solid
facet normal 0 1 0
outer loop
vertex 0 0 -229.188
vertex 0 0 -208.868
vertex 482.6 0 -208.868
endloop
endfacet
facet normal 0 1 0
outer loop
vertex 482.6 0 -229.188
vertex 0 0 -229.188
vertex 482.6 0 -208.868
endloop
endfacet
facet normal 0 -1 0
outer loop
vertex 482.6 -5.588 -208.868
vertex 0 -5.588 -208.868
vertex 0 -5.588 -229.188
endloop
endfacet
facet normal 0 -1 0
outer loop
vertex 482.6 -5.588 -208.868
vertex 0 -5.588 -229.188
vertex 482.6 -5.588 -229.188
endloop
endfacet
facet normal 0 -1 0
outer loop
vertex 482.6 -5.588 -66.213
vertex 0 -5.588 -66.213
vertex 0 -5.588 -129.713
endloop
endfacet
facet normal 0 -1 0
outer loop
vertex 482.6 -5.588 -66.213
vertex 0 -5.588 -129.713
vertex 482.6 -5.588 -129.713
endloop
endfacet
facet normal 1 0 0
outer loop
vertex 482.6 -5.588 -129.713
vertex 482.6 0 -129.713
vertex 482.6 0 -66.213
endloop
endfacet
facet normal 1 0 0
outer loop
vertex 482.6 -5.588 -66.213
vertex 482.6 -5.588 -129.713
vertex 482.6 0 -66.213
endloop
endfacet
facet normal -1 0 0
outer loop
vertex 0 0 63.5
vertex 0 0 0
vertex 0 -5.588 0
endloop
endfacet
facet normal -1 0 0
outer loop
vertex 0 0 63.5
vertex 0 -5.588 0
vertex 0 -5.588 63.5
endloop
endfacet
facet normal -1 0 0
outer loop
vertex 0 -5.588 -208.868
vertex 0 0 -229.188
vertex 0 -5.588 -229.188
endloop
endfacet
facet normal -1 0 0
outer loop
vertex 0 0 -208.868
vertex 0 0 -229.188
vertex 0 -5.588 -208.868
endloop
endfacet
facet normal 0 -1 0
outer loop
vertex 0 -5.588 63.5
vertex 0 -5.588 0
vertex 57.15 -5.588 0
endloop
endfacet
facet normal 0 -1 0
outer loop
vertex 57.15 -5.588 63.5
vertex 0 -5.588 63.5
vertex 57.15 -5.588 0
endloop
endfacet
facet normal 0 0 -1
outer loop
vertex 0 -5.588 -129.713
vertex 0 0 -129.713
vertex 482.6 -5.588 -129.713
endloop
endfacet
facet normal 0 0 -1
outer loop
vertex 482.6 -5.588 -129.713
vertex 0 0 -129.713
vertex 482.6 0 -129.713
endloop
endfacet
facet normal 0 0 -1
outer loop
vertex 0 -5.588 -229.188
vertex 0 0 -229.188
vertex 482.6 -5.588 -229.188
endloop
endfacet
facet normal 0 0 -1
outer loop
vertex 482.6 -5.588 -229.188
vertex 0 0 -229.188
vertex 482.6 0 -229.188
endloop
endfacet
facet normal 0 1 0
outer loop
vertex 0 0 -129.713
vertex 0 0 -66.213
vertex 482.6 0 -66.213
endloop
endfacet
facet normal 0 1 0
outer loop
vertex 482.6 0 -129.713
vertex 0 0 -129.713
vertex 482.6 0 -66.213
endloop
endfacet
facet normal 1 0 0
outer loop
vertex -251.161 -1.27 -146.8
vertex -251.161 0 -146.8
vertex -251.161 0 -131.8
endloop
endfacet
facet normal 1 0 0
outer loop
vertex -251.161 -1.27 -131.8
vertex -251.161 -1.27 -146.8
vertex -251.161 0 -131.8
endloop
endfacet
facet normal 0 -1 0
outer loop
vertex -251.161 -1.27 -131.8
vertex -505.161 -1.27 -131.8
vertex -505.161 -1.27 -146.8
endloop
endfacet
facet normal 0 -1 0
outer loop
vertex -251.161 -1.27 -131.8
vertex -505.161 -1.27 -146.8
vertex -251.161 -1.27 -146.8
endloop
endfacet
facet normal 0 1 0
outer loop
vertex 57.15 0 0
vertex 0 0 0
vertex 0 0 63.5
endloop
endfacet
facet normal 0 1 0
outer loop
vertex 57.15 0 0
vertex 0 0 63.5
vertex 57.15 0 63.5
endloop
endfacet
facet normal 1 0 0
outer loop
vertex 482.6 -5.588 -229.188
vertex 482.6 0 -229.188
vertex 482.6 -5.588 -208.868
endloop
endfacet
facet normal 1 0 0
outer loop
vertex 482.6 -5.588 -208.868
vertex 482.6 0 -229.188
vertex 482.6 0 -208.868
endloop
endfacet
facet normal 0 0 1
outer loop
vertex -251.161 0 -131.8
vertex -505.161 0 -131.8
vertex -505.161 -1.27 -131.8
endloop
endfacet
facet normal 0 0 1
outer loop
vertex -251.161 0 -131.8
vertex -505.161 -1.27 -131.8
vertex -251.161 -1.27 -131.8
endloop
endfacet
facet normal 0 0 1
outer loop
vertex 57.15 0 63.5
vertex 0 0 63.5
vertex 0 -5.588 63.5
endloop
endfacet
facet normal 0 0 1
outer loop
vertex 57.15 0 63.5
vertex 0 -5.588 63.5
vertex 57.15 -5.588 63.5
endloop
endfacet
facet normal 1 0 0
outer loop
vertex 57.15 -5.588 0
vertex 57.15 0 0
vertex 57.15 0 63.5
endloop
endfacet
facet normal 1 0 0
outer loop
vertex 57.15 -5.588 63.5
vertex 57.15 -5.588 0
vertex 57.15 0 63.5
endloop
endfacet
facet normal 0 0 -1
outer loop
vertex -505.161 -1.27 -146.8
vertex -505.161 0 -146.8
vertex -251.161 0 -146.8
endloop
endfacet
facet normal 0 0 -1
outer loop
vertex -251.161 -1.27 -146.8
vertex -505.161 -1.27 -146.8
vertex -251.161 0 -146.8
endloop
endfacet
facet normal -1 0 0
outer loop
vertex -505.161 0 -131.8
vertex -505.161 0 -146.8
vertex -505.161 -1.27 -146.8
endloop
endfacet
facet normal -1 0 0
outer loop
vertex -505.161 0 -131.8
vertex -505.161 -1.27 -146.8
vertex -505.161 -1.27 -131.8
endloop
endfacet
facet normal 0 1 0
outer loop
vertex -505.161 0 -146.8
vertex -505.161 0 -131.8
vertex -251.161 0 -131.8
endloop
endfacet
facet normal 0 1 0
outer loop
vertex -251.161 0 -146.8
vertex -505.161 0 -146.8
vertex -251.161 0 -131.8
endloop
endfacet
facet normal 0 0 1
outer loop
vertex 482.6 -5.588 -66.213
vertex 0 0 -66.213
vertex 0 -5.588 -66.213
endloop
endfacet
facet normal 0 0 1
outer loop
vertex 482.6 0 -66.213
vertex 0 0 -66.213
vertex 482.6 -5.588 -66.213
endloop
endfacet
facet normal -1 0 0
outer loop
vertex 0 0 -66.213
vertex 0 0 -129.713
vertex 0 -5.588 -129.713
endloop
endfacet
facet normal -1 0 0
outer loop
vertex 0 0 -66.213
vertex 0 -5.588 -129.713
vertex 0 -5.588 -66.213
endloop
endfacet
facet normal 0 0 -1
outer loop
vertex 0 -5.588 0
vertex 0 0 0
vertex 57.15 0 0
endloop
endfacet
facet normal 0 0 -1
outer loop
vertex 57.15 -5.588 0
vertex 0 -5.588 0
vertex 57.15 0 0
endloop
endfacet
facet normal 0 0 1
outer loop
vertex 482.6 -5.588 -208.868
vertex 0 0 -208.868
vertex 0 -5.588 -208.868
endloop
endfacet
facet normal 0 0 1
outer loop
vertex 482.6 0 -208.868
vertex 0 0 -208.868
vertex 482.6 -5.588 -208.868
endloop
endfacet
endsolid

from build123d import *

# Parameters (mm, degrees)
F0_W     = 57.15
F0_H     = 63.5
F1_DEPTH = 5.588
F0_W_2   = 482.6
F0_H_2   = 20.32
F2_W     = 254
F2_H     = 15
F3_DEPTH = 1.27


# Not quite as in the source:
# - a feature names something its author has since deleted; it is built from what else it names


with BuildPart() as f1:
    # F0 (on Front) → F1 (new body)
    with BuildSketch(Plane.XZ):
        with Locations((28.575, 31.75)):
            Rectangle(F0_W, F0_H)
    extrude(amount=F1_DEPTH)


with BuildPart() as f1b:
    # F0 (on Front) → F1, piece 2 (new body)
    with BuildSketch(Plane.XZ):
        with Locations((241.3, -97.9633150748)):
            Rectangle(F0_W_2, F0_H)
    extrude(amount=F1_DEPTH)


with BuildPart() as f1c:
    # F0 (on Front) → F1, piece 3 (new body)
    with BuildSketch(Plane.XZ):
        with Locations((241.3, -219.0275779629)):
            Rectangle(F0_W_2, F0_H_2)
    extrude(amount=F1_DEPTH)


with BuildPart() as f3:
    # F2 (on Front) → F3 (new body)
    with BuildSketch(Plane.XZ):
        with Locations((-378.1612176895, -139.3002796173)):
            Rectangle(F2_W, F2_H)
    extrude(amount=F3_DEPTH)


solid = Compound([f1.part, f1b.part, f1c.part, f3.part])
